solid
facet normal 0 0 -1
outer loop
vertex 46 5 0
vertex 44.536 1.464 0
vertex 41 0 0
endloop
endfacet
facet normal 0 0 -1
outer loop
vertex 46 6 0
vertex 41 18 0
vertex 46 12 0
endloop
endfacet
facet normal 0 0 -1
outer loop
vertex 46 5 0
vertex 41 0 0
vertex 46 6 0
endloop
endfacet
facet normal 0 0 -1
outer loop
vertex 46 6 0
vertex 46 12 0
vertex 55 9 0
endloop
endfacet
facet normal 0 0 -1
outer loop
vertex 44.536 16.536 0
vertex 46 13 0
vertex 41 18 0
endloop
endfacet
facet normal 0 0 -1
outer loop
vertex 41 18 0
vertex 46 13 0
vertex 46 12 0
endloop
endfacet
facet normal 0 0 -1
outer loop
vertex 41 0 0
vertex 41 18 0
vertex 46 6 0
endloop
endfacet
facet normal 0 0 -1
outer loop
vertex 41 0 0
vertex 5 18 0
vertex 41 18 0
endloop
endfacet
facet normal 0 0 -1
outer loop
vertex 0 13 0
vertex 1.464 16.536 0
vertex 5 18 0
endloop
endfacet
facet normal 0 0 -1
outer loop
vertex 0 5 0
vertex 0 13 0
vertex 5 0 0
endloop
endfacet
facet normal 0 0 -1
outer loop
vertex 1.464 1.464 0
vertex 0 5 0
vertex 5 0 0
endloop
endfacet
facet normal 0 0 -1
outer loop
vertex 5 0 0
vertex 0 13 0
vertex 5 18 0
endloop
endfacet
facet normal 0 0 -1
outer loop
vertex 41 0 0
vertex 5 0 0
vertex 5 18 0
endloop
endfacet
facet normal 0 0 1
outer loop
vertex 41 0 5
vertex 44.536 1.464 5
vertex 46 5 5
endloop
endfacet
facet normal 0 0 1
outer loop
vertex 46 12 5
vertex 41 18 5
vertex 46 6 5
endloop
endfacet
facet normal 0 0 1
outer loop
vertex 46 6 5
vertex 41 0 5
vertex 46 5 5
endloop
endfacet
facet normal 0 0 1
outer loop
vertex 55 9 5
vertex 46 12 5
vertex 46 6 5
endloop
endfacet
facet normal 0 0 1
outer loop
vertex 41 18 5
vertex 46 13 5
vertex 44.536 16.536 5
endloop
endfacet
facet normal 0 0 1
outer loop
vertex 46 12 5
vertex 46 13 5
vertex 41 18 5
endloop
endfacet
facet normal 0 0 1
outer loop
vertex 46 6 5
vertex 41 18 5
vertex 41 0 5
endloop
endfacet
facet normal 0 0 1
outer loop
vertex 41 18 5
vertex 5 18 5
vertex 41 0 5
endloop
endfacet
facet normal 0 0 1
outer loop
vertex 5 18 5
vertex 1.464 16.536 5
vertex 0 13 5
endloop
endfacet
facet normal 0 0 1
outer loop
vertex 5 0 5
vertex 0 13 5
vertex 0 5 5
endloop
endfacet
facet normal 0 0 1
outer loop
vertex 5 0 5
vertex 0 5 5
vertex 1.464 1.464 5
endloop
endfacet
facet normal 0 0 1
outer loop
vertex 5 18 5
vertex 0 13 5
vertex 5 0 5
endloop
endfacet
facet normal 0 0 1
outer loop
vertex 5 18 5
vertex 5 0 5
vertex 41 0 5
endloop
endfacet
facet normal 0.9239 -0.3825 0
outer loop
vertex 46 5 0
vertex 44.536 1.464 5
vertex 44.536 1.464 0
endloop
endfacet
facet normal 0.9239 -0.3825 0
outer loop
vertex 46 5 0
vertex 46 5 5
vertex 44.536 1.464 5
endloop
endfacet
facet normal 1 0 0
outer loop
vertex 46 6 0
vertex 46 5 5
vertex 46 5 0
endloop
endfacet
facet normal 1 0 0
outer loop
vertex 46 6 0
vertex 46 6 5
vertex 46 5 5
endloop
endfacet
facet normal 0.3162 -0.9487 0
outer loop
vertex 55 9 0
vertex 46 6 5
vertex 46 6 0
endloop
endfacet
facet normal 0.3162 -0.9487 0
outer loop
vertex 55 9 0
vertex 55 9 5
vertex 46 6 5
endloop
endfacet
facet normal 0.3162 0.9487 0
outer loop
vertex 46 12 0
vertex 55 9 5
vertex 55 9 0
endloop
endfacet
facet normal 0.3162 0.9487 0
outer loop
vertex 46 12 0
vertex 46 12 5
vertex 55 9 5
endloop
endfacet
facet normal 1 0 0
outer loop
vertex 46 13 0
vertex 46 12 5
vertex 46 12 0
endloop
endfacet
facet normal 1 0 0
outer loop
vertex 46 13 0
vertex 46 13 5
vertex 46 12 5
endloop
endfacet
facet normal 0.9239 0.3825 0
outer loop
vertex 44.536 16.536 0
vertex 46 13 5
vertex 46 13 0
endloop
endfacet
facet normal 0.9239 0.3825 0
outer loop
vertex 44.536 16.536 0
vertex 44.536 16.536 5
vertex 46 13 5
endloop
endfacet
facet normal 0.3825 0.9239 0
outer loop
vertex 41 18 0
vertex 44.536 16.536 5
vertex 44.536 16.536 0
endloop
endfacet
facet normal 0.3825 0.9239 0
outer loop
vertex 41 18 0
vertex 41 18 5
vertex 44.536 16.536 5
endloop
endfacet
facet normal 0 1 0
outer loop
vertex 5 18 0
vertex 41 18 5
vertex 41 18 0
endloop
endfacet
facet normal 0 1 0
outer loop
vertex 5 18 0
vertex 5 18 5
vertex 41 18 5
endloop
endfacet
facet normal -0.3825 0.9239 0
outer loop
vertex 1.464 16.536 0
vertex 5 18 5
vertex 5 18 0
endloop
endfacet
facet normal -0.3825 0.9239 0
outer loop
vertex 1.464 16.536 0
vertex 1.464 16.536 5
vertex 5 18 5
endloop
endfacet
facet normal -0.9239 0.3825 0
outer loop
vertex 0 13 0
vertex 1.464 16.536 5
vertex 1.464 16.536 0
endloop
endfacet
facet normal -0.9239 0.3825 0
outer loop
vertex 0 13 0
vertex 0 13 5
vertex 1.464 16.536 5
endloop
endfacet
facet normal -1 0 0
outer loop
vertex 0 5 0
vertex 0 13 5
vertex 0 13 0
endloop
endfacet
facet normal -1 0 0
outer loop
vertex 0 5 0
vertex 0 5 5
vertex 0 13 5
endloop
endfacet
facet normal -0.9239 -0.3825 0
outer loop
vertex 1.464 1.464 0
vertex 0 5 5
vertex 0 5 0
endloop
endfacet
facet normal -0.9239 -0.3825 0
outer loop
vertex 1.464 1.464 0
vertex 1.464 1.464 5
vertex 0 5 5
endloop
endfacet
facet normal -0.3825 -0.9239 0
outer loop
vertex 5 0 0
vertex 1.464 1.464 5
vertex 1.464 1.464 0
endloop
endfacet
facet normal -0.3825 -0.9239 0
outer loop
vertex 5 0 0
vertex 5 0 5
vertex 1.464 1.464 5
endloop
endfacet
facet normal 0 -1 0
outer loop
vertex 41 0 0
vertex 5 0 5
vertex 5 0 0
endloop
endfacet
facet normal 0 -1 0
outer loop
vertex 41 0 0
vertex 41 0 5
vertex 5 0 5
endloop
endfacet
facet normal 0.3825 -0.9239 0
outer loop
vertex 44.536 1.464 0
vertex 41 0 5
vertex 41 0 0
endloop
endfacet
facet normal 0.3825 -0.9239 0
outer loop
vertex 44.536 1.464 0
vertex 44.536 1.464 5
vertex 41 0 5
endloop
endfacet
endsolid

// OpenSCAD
$fn = 32;

// ----------------------------------------------------------------------
// Ratchet pawl: 46 x 18 mm body, beak 9 mm с правого торца
// ----------------------------------------------------------------------

// --- parameters (mm) ---
profile_height = 5;       // extrusion height
profile_points = 15;      // points of the closed outline

profile = [[0, 5], [1.464, 1.464], [5, 0], [41, 0], [44.536, 1.464], [46, 5], [46, 6], [55, 9], [46, 12], [46, 13], [44.536, 16.536], [41, 18], [5, 18], [1.464, 16.536], [0, 13]];  // single closed polygon, 15 points, counter clockwise

// --- the one profile operation ---
linear_extrude(height = profile_height) polygon(points = profile);
